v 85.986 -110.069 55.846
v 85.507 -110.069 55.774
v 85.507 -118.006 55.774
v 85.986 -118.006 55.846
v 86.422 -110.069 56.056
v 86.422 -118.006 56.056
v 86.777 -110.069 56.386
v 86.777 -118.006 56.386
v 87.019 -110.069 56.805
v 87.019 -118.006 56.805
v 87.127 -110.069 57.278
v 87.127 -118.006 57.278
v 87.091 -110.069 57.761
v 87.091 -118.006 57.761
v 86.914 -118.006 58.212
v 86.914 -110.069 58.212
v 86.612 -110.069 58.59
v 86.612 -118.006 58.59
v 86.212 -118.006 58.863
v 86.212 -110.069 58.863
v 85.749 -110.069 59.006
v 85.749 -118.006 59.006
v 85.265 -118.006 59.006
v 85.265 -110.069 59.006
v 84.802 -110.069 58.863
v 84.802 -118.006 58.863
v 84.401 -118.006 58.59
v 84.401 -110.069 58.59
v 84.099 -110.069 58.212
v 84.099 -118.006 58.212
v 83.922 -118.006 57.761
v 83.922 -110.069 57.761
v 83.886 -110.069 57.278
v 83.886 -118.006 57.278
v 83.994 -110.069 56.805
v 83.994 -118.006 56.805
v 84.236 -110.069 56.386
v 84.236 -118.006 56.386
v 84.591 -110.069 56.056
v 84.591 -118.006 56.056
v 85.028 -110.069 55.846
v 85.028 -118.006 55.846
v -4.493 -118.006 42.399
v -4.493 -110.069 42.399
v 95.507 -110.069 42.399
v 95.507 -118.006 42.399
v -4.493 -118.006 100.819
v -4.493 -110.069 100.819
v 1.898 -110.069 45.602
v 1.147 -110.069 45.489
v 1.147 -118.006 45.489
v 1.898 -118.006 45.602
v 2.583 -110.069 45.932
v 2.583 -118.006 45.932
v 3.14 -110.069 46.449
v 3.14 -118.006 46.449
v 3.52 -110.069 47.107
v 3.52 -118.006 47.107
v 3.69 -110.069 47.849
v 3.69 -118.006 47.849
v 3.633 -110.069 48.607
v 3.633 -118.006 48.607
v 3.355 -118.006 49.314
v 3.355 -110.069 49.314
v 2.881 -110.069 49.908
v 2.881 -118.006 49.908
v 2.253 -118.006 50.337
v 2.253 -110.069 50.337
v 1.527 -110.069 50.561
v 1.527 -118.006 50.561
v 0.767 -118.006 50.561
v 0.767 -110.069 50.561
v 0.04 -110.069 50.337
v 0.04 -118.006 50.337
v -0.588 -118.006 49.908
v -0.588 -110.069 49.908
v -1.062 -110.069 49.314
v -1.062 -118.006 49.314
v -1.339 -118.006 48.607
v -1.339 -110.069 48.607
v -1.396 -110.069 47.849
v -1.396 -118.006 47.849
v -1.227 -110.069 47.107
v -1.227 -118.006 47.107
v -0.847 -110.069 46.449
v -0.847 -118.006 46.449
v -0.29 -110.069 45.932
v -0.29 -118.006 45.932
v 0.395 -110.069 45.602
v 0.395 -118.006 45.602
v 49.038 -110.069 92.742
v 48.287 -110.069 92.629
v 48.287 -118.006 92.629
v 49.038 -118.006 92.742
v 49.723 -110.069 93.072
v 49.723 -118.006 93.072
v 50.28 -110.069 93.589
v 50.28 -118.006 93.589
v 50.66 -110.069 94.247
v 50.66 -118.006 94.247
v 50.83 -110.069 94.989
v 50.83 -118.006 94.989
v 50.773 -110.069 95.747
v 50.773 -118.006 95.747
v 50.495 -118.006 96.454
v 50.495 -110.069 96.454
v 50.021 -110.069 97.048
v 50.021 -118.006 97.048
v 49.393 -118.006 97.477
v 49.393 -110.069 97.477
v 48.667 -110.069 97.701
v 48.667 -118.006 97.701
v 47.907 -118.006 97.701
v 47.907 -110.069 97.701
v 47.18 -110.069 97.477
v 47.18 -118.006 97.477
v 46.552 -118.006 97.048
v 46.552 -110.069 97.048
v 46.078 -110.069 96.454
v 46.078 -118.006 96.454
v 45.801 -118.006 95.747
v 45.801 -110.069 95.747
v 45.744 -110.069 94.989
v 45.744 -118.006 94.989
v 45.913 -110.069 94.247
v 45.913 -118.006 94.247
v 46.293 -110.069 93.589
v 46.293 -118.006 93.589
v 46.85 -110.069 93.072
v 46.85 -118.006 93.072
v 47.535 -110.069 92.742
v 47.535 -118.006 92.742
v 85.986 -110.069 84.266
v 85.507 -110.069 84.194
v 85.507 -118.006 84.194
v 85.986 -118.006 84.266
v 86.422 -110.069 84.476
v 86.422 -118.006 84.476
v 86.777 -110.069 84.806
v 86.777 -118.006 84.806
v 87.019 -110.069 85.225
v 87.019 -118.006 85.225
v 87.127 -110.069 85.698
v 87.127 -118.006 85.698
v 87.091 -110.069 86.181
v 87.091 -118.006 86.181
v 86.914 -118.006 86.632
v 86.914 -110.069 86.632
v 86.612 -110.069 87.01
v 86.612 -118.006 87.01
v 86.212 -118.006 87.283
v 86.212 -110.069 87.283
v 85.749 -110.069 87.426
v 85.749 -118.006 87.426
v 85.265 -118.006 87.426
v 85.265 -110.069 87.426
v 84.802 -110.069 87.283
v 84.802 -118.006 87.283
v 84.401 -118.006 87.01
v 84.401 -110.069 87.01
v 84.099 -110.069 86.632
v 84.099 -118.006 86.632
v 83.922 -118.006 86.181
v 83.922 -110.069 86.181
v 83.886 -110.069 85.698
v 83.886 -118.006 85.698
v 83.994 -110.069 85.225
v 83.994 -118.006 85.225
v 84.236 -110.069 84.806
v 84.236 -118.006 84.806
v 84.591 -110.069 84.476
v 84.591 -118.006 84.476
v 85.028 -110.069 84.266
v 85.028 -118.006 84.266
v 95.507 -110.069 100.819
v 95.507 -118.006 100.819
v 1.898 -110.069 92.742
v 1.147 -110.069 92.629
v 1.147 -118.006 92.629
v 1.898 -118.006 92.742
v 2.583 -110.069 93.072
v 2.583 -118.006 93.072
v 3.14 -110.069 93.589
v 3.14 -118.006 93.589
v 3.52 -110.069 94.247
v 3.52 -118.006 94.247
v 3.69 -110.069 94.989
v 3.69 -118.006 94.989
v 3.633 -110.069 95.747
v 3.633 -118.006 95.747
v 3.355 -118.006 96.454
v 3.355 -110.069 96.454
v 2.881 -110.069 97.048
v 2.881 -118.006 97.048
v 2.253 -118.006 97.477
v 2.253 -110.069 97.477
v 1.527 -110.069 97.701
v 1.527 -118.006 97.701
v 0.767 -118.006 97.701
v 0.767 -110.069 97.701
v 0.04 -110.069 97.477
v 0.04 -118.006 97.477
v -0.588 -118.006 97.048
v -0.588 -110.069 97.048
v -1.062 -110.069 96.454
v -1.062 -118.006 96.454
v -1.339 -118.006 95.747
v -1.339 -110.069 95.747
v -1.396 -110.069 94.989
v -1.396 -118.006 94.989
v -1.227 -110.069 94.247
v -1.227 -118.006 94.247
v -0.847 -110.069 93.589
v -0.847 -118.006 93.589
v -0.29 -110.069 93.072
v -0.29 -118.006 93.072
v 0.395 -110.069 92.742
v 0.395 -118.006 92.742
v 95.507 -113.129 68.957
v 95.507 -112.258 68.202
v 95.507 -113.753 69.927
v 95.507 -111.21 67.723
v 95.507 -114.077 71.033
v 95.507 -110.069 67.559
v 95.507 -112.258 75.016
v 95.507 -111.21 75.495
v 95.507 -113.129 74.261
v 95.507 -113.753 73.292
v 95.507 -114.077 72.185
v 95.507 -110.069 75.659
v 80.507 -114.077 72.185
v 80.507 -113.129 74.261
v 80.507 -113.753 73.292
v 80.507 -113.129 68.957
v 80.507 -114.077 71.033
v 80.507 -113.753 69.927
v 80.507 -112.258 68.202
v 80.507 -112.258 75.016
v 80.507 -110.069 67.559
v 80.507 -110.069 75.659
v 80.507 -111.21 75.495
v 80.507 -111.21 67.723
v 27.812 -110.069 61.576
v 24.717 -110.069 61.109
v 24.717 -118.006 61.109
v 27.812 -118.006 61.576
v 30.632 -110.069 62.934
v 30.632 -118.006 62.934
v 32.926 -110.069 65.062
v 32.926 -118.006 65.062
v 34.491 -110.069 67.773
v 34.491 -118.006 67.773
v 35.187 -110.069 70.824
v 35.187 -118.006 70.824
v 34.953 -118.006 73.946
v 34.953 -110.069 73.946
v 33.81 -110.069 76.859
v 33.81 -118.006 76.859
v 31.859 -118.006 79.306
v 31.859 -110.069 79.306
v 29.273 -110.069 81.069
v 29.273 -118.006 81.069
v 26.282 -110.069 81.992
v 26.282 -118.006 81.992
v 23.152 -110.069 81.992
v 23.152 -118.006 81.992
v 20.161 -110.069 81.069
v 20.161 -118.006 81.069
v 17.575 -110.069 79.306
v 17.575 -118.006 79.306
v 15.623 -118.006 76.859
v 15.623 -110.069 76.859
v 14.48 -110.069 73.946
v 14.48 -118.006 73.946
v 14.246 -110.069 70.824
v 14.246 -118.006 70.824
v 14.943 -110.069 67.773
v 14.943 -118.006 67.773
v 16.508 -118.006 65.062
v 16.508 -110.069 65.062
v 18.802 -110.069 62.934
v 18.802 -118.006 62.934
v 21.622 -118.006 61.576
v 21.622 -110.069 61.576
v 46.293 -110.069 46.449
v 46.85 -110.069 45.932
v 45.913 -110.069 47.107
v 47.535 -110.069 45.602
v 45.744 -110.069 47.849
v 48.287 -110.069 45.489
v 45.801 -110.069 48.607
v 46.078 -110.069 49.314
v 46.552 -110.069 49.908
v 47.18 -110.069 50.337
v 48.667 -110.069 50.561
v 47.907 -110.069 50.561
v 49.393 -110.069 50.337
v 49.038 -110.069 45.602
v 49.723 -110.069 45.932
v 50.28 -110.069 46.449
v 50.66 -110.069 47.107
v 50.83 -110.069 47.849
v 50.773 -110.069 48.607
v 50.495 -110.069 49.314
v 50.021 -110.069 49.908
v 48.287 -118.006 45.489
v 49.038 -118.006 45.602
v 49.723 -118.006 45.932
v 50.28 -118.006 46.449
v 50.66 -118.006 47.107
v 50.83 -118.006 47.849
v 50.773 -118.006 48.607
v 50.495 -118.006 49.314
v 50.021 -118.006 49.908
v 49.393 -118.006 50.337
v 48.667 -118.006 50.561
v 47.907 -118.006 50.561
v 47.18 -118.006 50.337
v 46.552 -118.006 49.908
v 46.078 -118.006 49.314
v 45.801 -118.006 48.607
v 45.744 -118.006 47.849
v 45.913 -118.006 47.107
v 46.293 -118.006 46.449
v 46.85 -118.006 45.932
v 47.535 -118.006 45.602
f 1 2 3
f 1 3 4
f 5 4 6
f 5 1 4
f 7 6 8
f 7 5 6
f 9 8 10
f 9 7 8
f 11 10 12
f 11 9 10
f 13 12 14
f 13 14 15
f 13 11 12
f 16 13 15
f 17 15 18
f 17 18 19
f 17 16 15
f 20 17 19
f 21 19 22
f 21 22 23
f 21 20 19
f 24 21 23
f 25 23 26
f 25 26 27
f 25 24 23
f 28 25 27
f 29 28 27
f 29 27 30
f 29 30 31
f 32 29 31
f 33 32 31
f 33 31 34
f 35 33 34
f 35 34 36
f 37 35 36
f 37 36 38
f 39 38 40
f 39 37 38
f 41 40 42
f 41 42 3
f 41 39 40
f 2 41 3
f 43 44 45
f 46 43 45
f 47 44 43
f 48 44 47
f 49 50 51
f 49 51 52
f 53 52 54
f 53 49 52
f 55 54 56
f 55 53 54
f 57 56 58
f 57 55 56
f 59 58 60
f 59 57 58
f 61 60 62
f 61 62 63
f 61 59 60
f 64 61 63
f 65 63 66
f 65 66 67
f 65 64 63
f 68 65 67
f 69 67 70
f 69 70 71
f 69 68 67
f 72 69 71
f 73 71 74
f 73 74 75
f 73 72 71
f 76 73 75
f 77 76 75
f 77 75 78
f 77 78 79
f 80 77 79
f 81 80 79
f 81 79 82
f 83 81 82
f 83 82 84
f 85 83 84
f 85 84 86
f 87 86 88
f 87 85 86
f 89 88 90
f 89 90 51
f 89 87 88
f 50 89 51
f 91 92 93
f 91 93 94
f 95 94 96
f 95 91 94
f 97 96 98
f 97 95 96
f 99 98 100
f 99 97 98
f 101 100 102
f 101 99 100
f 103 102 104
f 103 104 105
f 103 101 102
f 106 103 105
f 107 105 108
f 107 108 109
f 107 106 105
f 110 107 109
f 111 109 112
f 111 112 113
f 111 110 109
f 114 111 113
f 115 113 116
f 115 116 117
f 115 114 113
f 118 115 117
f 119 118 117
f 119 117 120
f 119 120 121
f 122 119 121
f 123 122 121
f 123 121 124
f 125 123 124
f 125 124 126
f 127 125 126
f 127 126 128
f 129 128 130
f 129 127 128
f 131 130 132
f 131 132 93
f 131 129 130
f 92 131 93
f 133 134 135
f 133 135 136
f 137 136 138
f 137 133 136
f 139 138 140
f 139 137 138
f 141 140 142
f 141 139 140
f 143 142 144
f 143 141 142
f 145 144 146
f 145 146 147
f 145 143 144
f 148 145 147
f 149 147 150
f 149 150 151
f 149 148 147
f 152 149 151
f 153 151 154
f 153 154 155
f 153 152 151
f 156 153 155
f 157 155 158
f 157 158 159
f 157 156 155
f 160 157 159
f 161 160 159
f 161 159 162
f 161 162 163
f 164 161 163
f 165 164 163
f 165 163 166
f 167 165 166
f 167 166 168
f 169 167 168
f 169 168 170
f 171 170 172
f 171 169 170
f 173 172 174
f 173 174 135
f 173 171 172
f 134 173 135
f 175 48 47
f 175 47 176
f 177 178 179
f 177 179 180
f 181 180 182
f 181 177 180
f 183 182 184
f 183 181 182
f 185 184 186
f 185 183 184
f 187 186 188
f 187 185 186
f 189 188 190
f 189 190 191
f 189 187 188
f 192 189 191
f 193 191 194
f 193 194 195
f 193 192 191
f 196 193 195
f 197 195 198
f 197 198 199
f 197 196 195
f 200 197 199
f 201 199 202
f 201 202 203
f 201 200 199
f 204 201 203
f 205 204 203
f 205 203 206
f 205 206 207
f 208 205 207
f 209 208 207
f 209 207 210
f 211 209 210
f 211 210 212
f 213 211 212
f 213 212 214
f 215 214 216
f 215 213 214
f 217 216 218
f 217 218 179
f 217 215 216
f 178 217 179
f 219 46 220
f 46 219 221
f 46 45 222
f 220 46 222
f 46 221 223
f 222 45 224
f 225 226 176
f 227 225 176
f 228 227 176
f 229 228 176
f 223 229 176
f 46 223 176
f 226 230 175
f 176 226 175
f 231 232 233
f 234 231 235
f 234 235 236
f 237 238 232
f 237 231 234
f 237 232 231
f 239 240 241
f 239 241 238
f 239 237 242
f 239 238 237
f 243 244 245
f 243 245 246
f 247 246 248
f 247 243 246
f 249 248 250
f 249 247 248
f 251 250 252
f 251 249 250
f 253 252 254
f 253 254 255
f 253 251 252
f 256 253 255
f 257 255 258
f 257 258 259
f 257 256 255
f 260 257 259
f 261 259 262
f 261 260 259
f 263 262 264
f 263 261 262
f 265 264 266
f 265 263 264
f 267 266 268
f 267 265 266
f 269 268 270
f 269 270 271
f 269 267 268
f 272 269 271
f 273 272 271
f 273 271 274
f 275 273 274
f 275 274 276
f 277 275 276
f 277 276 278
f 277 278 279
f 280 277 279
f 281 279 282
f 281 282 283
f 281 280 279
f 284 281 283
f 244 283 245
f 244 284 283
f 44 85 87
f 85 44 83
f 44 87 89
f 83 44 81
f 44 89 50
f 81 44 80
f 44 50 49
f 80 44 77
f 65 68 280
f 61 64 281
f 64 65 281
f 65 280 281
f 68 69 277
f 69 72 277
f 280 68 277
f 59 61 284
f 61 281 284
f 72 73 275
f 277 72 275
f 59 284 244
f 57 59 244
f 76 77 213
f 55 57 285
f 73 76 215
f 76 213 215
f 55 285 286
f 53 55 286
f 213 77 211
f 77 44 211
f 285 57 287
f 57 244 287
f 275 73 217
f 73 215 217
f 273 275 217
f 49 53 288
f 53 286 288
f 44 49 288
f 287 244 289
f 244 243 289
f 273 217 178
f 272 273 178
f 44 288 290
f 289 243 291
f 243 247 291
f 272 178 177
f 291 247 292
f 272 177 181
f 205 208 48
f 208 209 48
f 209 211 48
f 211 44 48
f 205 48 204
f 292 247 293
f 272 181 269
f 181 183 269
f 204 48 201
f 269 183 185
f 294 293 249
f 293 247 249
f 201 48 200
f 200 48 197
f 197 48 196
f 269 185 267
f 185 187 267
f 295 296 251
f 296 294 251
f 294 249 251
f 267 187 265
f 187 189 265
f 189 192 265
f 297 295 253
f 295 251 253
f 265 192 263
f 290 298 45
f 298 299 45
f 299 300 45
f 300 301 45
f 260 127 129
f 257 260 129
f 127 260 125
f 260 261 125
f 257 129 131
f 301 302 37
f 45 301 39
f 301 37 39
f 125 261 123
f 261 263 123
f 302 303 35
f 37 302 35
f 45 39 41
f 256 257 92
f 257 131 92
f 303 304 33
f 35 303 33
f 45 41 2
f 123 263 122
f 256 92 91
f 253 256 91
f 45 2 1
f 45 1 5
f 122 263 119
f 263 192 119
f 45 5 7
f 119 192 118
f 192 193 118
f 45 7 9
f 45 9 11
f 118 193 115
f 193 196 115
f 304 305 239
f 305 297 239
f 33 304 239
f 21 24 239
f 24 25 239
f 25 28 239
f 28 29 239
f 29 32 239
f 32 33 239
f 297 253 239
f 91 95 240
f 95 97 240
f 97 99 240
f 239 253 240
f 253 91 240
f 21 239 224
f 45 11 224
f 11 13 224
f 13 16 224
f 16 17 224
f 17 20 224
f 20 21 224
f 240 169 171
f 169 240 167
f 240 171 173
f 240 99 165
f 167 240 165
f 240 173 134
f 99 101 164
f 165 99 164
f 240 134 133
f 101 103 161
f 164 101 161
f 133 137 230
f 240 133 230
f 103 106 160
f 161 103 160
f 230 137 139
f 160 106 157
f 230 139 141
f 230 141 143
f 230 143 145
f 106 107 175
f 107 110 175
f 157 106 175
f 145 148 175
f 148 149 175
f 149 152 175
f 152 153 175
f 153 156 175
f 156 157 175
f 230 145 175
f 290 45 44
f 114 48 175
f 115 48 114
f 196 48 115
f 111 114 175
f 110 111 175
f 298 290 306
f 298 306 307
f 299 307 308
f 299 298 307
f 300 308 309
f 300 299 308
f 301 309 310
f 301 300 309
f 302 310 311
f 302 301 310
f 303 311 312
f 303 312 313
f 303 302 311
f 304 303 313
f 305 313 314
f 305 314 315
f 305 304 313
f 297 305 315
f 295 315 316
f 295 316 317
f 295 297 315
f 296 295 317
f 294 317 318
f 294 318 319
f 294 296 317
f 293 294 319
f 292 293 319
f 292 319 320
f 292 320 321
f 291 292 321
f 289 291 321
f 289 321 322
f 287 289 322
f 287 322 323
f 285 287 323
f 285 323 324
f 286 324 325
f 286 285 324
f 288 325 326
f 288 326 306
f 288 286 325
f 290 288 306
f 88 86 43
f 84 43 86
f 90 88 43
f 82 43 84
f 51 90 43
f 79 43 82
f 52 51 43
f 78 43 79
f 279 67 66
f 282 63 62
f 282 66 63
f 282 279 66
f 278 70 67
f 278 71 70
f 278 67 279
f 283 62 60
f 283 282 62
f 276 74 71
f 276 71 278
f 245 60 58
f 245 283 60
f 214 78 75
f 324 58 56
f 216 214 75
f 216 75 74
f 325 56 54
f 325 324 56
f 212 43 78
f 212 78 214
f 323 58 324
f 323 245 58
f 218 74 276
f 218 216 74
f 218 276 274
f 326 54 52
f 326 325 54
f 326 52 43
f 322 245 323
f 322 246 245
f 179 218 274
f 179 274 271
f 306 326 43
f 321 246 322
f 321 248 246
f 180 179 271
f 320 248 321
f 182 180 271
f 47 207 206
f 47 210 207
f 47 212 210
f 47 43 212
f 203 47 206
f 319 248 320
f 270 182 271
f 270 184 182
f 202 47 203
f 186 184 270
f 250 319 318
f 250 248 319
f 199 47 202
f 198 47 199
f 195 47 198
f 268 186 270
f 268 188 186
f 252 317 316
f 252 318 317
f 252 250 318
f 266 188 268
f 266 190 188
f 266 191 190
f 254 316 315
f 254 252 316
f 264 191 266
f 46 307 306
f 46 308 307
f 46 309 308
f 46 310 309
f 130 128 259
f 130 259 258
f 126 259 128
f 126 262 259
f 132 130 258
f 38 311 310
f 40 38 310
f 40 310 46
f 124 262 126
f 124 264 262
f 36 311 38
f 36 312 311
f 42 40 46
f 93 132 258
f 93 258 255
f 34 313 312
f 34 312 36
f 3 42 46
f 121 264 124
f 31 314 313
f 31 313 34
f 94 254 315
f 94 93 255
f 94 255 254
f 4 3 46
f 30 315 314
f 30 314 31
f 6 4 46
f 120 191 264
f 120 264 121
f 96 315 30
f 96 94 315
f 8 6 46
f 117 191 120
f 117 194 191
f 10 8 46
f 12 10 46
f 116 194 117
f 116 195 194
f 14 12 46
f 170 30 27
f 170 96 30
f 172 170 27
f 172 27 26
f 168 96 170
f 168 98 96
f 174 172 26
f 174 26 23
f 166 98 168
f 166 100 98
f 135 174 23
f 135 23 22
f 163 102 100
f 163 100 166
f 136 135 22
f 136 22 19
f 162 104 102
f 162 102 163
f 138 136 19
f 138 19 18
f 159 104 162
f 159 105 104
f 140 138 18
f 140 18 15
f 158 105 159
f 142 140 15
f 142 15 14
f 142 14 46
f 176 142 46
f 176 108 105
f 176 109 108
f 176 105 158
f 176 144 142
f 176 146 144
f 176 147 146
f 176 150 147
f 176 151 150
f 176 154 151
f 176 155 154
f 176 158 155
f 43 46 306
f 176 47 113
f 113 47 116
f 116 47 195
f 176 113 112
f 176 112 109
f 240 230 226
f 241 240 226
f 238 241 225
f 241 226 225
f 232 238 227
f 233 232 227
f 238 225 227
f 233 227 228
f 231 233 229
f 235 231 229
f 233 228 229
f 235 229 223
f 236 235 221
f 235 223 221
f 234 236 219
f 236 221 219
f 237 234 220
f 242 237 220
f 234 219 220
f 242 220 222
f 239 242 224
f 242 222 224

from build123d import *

# Parameters (mm, degrees)
SKETCH1_W           = 100
SKETCH1_H           = 58.42
SKETCH1_R           = 2.55
SKETCH1_R_2         = 1.625
SKETCH1_R_3         = 10.5
BOSS_EXTRUDE1_DEPTH = 7.9375
SKETCH2_R           = 4.05
CUT_EXTRUDE1_DEPTH  = 15


with BuildPart() as part:
    # Sketch1 → Boss-Extrude1 (new body)
    with BuildSketch(Plane.XZ.offset(110.068674648)):
        with Locations((45.506748586, 71.609111908)):
            Rectangle(SKETCH1_W, SKETCH1_H)
        with Locations(Location((1.146748586, 95.179111908, 0), (0, 0, 270))):
            Circle(SKETCH1_R, mode=Mode.SUBTRACT)
        with Locations(Location((1.146748586, 48.039111908, 0), (0, 0, 270))):
            Circle(SKETCH1_R, mode=Mode.SUBTRACT)
        with Locations(Location((48.286748586, 48.039111908, 0), (0, 0, 270))):
            Circle(SKETCH1_R, mode=Mode.SUBTRACT)
        with Locations(Location((48.286748586, 95.179111908, 0), (0, 0, 270))):
            Circle(SKETCH1_R, mode=Mode.SUBTRACT)
        with Locations(Location((85.506748586, 85.819111908, 0), (0, 0, 270))):
            Circle(SKETCH1_R_2, mode=Mode.SUBTRACT)
        with Locations(Location((85.506748586, 57.399111908, 0), (0, 0, 270))):
            Circle(SKETCH1_R_2, mode=Mode.SUBTRACT)
        with Locations(Location((24.716748586, 71.609111908, 0), (0, 0, 270))):
            Circle(SKETCH1_R_3, mode=Mode.SUBTRACT)
    extrude(amount=BOSS_EXTRUDE1_DEPTH)

    # Sketch2 → Cut-Extrude1 (cut)
    with BuildSketch(Plane(origin=(95.506748586, -1.5875, 13.918119016), x_dir=(0, 0, -1), z_dir=(1, 0, 0))):
        with Locations((-57.690992892, -108.481174648)):
            Circle(SKETCH2_R)
    extrude(amount=-CUT_EXTRUDE1_DEPTH, mode=Mode.SUBTRACT)


solid = part.part
